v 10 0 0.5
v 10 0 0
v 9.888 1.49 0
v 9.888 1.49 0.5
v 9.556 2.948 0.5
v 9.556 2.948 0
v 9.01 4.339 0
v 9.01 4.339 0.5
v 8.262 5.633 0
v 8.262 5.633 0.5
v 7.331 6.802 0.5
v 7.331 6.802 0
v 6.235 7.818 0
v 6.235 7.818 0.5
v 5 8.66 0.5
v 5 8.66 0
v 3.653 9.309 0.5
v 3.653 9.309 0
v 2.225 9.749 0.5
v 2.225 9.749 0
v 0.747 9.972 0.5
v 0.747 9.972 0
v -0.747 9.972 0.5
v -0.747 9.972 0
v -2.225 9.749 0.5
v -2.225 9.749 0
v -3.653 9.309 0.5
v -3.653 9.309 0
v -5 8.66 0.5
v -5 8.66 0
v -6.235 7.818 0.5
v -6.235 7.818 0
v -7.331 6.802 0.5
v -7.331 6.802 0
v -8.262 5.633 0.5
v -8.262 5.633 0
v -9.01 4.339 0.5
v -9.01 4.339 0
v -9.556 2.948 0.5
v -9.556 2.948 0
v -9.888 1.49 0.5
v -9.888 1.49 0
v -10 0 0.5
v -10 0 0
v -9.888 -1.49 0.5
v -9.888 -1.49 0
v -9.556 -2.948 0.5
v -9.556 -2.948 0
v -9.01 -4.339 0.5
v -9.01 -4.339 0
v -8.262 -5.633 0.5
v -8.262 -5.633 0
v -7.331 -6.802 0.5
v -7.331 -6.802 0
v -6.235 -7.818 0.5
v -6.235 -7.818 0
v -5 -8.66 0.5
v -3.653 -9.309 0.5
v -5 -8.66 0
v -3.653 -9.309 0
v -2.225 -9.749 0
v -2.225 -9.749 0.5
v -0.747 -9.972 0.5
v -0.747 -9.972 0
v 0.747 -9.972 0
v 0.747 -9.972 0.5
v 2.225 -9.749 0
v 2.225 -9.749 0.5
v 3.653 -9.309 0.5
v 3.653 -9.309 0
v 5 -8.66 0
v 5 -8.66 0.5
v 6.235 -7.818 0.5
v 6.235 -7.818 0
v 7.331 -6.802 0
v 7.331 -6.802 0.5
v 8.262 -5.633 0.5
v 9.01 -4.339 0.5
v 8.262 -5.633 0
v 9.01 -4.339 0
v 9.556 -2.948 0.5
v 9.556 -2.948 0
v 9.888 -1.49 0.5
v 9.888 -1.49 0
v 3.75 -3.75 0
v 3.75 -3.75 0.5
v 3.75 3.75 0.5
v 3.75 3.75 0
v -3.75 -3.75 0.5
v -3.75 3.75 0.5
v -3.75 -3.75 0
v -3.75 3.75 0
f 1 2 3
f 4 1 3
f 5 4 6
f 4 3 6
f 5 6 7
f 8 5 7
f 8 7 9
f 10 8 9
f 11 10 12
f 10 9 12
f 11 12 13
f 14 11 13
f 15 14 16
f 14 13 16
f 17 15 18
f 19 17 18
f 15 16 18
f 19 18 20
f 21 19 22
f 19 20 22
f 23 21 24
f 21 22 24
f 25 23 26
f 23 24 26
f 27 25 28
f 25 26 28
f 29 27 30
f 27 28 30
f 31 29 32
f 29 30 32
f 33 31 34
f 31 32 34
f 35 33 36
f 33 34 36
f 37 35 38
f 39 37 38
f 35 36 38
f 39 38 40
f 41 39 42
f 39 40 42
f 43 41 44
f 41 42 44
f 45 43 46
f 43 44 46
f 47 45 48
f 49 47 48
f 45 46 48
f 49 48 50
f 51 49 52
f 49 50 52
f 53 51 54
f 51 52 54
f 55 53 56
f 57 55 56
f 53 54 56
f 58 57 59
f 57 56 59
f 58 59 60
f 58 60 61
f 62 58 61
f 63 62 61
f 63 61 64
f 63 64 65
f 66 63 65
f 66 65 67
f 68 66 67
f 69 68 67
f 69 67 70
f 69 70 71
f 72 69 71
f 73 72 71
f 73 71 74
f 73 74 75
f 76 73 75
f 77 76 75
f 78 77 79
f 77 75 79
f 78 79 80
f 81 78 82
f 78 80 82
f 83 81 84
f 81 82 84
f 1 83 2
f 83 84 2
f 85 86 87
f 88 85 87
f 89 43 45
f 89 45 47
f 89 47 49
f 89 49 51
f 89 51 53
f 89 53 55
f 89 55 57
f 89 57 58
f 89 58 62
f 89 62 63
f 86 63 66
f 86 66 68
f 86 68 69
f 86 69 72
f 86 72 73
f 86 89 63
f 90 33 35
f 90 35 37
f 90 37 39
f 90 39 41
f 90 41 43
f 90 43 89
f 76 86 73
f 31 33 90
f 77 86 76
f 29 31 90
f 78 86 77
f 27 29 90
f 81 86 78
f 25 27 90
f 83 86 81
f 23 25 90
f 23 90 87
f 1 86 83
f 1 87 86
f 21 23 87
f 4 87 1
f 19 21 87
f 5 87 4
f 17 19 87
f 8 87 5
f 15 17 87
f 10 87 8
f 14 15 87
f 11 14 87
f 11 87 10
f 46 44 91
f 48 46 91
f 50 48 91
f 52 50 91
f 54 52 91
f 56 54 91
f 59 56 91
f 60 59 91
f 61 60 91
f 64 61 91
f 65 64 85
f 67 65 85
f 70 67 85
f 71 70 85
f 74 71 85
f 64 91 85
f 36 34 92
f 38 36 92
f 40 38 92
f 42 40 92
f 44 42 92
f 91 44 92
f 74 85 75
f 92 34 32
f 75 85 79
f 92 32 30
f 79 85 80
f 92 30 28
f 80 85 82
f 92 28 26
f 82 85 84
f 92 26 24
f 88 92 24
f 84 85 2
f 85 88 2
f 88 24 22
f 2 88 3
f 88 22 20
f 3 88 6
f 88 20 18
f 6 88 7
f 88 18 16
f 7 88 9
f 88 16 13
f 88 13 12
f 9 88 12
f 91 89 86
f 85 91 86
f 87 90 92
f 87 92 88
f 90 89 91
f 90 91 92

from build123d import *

# Parameters (mm, degrees)
SKETCH1_R           = 10
BOSS_EXTRUDE1_DEPTH = 0.5
SKETCH2_W           = 7.5
SKETCH2_H           = 7.5
BOSS_EXTRUDE2_DEPTH = 0.5
SKETCH3_W           = 7.5
SKETCH3_H           = 7.5
CUT_EXTRUDE1_DEPTH  = 15.150971698


with BuildPart() as part:
    # Sketch1 → Boss-Extrude1 (new body)
    with BuildSketch(Plane.XY):
        Circle(SKETCH1_R)
    extrude(amount=BOSS_EXTRUDE1_DEPTH)

    # Sketch2 → Boss-Extrude2 (add, through all)
    with BuildSketch(Plane.XY.offset(0.5)):
        Rectangle(SKETCH2_W, SKETCH2_H)
    extrude(amount=-BOSS_EXTRUDE2_DEPTH)

    # Sketch3 → Cut-Extrude1 (cut, through all)
    with BuildSketch(Plane.XY.offset(0.5)):
        Rectangle(SKETCH3_W, SKETCH3_H)
    extrude(amount=-CUT_EXTRUDE1_DEPTH, mode=Mode.SUBTRACT)


solid = part.part
